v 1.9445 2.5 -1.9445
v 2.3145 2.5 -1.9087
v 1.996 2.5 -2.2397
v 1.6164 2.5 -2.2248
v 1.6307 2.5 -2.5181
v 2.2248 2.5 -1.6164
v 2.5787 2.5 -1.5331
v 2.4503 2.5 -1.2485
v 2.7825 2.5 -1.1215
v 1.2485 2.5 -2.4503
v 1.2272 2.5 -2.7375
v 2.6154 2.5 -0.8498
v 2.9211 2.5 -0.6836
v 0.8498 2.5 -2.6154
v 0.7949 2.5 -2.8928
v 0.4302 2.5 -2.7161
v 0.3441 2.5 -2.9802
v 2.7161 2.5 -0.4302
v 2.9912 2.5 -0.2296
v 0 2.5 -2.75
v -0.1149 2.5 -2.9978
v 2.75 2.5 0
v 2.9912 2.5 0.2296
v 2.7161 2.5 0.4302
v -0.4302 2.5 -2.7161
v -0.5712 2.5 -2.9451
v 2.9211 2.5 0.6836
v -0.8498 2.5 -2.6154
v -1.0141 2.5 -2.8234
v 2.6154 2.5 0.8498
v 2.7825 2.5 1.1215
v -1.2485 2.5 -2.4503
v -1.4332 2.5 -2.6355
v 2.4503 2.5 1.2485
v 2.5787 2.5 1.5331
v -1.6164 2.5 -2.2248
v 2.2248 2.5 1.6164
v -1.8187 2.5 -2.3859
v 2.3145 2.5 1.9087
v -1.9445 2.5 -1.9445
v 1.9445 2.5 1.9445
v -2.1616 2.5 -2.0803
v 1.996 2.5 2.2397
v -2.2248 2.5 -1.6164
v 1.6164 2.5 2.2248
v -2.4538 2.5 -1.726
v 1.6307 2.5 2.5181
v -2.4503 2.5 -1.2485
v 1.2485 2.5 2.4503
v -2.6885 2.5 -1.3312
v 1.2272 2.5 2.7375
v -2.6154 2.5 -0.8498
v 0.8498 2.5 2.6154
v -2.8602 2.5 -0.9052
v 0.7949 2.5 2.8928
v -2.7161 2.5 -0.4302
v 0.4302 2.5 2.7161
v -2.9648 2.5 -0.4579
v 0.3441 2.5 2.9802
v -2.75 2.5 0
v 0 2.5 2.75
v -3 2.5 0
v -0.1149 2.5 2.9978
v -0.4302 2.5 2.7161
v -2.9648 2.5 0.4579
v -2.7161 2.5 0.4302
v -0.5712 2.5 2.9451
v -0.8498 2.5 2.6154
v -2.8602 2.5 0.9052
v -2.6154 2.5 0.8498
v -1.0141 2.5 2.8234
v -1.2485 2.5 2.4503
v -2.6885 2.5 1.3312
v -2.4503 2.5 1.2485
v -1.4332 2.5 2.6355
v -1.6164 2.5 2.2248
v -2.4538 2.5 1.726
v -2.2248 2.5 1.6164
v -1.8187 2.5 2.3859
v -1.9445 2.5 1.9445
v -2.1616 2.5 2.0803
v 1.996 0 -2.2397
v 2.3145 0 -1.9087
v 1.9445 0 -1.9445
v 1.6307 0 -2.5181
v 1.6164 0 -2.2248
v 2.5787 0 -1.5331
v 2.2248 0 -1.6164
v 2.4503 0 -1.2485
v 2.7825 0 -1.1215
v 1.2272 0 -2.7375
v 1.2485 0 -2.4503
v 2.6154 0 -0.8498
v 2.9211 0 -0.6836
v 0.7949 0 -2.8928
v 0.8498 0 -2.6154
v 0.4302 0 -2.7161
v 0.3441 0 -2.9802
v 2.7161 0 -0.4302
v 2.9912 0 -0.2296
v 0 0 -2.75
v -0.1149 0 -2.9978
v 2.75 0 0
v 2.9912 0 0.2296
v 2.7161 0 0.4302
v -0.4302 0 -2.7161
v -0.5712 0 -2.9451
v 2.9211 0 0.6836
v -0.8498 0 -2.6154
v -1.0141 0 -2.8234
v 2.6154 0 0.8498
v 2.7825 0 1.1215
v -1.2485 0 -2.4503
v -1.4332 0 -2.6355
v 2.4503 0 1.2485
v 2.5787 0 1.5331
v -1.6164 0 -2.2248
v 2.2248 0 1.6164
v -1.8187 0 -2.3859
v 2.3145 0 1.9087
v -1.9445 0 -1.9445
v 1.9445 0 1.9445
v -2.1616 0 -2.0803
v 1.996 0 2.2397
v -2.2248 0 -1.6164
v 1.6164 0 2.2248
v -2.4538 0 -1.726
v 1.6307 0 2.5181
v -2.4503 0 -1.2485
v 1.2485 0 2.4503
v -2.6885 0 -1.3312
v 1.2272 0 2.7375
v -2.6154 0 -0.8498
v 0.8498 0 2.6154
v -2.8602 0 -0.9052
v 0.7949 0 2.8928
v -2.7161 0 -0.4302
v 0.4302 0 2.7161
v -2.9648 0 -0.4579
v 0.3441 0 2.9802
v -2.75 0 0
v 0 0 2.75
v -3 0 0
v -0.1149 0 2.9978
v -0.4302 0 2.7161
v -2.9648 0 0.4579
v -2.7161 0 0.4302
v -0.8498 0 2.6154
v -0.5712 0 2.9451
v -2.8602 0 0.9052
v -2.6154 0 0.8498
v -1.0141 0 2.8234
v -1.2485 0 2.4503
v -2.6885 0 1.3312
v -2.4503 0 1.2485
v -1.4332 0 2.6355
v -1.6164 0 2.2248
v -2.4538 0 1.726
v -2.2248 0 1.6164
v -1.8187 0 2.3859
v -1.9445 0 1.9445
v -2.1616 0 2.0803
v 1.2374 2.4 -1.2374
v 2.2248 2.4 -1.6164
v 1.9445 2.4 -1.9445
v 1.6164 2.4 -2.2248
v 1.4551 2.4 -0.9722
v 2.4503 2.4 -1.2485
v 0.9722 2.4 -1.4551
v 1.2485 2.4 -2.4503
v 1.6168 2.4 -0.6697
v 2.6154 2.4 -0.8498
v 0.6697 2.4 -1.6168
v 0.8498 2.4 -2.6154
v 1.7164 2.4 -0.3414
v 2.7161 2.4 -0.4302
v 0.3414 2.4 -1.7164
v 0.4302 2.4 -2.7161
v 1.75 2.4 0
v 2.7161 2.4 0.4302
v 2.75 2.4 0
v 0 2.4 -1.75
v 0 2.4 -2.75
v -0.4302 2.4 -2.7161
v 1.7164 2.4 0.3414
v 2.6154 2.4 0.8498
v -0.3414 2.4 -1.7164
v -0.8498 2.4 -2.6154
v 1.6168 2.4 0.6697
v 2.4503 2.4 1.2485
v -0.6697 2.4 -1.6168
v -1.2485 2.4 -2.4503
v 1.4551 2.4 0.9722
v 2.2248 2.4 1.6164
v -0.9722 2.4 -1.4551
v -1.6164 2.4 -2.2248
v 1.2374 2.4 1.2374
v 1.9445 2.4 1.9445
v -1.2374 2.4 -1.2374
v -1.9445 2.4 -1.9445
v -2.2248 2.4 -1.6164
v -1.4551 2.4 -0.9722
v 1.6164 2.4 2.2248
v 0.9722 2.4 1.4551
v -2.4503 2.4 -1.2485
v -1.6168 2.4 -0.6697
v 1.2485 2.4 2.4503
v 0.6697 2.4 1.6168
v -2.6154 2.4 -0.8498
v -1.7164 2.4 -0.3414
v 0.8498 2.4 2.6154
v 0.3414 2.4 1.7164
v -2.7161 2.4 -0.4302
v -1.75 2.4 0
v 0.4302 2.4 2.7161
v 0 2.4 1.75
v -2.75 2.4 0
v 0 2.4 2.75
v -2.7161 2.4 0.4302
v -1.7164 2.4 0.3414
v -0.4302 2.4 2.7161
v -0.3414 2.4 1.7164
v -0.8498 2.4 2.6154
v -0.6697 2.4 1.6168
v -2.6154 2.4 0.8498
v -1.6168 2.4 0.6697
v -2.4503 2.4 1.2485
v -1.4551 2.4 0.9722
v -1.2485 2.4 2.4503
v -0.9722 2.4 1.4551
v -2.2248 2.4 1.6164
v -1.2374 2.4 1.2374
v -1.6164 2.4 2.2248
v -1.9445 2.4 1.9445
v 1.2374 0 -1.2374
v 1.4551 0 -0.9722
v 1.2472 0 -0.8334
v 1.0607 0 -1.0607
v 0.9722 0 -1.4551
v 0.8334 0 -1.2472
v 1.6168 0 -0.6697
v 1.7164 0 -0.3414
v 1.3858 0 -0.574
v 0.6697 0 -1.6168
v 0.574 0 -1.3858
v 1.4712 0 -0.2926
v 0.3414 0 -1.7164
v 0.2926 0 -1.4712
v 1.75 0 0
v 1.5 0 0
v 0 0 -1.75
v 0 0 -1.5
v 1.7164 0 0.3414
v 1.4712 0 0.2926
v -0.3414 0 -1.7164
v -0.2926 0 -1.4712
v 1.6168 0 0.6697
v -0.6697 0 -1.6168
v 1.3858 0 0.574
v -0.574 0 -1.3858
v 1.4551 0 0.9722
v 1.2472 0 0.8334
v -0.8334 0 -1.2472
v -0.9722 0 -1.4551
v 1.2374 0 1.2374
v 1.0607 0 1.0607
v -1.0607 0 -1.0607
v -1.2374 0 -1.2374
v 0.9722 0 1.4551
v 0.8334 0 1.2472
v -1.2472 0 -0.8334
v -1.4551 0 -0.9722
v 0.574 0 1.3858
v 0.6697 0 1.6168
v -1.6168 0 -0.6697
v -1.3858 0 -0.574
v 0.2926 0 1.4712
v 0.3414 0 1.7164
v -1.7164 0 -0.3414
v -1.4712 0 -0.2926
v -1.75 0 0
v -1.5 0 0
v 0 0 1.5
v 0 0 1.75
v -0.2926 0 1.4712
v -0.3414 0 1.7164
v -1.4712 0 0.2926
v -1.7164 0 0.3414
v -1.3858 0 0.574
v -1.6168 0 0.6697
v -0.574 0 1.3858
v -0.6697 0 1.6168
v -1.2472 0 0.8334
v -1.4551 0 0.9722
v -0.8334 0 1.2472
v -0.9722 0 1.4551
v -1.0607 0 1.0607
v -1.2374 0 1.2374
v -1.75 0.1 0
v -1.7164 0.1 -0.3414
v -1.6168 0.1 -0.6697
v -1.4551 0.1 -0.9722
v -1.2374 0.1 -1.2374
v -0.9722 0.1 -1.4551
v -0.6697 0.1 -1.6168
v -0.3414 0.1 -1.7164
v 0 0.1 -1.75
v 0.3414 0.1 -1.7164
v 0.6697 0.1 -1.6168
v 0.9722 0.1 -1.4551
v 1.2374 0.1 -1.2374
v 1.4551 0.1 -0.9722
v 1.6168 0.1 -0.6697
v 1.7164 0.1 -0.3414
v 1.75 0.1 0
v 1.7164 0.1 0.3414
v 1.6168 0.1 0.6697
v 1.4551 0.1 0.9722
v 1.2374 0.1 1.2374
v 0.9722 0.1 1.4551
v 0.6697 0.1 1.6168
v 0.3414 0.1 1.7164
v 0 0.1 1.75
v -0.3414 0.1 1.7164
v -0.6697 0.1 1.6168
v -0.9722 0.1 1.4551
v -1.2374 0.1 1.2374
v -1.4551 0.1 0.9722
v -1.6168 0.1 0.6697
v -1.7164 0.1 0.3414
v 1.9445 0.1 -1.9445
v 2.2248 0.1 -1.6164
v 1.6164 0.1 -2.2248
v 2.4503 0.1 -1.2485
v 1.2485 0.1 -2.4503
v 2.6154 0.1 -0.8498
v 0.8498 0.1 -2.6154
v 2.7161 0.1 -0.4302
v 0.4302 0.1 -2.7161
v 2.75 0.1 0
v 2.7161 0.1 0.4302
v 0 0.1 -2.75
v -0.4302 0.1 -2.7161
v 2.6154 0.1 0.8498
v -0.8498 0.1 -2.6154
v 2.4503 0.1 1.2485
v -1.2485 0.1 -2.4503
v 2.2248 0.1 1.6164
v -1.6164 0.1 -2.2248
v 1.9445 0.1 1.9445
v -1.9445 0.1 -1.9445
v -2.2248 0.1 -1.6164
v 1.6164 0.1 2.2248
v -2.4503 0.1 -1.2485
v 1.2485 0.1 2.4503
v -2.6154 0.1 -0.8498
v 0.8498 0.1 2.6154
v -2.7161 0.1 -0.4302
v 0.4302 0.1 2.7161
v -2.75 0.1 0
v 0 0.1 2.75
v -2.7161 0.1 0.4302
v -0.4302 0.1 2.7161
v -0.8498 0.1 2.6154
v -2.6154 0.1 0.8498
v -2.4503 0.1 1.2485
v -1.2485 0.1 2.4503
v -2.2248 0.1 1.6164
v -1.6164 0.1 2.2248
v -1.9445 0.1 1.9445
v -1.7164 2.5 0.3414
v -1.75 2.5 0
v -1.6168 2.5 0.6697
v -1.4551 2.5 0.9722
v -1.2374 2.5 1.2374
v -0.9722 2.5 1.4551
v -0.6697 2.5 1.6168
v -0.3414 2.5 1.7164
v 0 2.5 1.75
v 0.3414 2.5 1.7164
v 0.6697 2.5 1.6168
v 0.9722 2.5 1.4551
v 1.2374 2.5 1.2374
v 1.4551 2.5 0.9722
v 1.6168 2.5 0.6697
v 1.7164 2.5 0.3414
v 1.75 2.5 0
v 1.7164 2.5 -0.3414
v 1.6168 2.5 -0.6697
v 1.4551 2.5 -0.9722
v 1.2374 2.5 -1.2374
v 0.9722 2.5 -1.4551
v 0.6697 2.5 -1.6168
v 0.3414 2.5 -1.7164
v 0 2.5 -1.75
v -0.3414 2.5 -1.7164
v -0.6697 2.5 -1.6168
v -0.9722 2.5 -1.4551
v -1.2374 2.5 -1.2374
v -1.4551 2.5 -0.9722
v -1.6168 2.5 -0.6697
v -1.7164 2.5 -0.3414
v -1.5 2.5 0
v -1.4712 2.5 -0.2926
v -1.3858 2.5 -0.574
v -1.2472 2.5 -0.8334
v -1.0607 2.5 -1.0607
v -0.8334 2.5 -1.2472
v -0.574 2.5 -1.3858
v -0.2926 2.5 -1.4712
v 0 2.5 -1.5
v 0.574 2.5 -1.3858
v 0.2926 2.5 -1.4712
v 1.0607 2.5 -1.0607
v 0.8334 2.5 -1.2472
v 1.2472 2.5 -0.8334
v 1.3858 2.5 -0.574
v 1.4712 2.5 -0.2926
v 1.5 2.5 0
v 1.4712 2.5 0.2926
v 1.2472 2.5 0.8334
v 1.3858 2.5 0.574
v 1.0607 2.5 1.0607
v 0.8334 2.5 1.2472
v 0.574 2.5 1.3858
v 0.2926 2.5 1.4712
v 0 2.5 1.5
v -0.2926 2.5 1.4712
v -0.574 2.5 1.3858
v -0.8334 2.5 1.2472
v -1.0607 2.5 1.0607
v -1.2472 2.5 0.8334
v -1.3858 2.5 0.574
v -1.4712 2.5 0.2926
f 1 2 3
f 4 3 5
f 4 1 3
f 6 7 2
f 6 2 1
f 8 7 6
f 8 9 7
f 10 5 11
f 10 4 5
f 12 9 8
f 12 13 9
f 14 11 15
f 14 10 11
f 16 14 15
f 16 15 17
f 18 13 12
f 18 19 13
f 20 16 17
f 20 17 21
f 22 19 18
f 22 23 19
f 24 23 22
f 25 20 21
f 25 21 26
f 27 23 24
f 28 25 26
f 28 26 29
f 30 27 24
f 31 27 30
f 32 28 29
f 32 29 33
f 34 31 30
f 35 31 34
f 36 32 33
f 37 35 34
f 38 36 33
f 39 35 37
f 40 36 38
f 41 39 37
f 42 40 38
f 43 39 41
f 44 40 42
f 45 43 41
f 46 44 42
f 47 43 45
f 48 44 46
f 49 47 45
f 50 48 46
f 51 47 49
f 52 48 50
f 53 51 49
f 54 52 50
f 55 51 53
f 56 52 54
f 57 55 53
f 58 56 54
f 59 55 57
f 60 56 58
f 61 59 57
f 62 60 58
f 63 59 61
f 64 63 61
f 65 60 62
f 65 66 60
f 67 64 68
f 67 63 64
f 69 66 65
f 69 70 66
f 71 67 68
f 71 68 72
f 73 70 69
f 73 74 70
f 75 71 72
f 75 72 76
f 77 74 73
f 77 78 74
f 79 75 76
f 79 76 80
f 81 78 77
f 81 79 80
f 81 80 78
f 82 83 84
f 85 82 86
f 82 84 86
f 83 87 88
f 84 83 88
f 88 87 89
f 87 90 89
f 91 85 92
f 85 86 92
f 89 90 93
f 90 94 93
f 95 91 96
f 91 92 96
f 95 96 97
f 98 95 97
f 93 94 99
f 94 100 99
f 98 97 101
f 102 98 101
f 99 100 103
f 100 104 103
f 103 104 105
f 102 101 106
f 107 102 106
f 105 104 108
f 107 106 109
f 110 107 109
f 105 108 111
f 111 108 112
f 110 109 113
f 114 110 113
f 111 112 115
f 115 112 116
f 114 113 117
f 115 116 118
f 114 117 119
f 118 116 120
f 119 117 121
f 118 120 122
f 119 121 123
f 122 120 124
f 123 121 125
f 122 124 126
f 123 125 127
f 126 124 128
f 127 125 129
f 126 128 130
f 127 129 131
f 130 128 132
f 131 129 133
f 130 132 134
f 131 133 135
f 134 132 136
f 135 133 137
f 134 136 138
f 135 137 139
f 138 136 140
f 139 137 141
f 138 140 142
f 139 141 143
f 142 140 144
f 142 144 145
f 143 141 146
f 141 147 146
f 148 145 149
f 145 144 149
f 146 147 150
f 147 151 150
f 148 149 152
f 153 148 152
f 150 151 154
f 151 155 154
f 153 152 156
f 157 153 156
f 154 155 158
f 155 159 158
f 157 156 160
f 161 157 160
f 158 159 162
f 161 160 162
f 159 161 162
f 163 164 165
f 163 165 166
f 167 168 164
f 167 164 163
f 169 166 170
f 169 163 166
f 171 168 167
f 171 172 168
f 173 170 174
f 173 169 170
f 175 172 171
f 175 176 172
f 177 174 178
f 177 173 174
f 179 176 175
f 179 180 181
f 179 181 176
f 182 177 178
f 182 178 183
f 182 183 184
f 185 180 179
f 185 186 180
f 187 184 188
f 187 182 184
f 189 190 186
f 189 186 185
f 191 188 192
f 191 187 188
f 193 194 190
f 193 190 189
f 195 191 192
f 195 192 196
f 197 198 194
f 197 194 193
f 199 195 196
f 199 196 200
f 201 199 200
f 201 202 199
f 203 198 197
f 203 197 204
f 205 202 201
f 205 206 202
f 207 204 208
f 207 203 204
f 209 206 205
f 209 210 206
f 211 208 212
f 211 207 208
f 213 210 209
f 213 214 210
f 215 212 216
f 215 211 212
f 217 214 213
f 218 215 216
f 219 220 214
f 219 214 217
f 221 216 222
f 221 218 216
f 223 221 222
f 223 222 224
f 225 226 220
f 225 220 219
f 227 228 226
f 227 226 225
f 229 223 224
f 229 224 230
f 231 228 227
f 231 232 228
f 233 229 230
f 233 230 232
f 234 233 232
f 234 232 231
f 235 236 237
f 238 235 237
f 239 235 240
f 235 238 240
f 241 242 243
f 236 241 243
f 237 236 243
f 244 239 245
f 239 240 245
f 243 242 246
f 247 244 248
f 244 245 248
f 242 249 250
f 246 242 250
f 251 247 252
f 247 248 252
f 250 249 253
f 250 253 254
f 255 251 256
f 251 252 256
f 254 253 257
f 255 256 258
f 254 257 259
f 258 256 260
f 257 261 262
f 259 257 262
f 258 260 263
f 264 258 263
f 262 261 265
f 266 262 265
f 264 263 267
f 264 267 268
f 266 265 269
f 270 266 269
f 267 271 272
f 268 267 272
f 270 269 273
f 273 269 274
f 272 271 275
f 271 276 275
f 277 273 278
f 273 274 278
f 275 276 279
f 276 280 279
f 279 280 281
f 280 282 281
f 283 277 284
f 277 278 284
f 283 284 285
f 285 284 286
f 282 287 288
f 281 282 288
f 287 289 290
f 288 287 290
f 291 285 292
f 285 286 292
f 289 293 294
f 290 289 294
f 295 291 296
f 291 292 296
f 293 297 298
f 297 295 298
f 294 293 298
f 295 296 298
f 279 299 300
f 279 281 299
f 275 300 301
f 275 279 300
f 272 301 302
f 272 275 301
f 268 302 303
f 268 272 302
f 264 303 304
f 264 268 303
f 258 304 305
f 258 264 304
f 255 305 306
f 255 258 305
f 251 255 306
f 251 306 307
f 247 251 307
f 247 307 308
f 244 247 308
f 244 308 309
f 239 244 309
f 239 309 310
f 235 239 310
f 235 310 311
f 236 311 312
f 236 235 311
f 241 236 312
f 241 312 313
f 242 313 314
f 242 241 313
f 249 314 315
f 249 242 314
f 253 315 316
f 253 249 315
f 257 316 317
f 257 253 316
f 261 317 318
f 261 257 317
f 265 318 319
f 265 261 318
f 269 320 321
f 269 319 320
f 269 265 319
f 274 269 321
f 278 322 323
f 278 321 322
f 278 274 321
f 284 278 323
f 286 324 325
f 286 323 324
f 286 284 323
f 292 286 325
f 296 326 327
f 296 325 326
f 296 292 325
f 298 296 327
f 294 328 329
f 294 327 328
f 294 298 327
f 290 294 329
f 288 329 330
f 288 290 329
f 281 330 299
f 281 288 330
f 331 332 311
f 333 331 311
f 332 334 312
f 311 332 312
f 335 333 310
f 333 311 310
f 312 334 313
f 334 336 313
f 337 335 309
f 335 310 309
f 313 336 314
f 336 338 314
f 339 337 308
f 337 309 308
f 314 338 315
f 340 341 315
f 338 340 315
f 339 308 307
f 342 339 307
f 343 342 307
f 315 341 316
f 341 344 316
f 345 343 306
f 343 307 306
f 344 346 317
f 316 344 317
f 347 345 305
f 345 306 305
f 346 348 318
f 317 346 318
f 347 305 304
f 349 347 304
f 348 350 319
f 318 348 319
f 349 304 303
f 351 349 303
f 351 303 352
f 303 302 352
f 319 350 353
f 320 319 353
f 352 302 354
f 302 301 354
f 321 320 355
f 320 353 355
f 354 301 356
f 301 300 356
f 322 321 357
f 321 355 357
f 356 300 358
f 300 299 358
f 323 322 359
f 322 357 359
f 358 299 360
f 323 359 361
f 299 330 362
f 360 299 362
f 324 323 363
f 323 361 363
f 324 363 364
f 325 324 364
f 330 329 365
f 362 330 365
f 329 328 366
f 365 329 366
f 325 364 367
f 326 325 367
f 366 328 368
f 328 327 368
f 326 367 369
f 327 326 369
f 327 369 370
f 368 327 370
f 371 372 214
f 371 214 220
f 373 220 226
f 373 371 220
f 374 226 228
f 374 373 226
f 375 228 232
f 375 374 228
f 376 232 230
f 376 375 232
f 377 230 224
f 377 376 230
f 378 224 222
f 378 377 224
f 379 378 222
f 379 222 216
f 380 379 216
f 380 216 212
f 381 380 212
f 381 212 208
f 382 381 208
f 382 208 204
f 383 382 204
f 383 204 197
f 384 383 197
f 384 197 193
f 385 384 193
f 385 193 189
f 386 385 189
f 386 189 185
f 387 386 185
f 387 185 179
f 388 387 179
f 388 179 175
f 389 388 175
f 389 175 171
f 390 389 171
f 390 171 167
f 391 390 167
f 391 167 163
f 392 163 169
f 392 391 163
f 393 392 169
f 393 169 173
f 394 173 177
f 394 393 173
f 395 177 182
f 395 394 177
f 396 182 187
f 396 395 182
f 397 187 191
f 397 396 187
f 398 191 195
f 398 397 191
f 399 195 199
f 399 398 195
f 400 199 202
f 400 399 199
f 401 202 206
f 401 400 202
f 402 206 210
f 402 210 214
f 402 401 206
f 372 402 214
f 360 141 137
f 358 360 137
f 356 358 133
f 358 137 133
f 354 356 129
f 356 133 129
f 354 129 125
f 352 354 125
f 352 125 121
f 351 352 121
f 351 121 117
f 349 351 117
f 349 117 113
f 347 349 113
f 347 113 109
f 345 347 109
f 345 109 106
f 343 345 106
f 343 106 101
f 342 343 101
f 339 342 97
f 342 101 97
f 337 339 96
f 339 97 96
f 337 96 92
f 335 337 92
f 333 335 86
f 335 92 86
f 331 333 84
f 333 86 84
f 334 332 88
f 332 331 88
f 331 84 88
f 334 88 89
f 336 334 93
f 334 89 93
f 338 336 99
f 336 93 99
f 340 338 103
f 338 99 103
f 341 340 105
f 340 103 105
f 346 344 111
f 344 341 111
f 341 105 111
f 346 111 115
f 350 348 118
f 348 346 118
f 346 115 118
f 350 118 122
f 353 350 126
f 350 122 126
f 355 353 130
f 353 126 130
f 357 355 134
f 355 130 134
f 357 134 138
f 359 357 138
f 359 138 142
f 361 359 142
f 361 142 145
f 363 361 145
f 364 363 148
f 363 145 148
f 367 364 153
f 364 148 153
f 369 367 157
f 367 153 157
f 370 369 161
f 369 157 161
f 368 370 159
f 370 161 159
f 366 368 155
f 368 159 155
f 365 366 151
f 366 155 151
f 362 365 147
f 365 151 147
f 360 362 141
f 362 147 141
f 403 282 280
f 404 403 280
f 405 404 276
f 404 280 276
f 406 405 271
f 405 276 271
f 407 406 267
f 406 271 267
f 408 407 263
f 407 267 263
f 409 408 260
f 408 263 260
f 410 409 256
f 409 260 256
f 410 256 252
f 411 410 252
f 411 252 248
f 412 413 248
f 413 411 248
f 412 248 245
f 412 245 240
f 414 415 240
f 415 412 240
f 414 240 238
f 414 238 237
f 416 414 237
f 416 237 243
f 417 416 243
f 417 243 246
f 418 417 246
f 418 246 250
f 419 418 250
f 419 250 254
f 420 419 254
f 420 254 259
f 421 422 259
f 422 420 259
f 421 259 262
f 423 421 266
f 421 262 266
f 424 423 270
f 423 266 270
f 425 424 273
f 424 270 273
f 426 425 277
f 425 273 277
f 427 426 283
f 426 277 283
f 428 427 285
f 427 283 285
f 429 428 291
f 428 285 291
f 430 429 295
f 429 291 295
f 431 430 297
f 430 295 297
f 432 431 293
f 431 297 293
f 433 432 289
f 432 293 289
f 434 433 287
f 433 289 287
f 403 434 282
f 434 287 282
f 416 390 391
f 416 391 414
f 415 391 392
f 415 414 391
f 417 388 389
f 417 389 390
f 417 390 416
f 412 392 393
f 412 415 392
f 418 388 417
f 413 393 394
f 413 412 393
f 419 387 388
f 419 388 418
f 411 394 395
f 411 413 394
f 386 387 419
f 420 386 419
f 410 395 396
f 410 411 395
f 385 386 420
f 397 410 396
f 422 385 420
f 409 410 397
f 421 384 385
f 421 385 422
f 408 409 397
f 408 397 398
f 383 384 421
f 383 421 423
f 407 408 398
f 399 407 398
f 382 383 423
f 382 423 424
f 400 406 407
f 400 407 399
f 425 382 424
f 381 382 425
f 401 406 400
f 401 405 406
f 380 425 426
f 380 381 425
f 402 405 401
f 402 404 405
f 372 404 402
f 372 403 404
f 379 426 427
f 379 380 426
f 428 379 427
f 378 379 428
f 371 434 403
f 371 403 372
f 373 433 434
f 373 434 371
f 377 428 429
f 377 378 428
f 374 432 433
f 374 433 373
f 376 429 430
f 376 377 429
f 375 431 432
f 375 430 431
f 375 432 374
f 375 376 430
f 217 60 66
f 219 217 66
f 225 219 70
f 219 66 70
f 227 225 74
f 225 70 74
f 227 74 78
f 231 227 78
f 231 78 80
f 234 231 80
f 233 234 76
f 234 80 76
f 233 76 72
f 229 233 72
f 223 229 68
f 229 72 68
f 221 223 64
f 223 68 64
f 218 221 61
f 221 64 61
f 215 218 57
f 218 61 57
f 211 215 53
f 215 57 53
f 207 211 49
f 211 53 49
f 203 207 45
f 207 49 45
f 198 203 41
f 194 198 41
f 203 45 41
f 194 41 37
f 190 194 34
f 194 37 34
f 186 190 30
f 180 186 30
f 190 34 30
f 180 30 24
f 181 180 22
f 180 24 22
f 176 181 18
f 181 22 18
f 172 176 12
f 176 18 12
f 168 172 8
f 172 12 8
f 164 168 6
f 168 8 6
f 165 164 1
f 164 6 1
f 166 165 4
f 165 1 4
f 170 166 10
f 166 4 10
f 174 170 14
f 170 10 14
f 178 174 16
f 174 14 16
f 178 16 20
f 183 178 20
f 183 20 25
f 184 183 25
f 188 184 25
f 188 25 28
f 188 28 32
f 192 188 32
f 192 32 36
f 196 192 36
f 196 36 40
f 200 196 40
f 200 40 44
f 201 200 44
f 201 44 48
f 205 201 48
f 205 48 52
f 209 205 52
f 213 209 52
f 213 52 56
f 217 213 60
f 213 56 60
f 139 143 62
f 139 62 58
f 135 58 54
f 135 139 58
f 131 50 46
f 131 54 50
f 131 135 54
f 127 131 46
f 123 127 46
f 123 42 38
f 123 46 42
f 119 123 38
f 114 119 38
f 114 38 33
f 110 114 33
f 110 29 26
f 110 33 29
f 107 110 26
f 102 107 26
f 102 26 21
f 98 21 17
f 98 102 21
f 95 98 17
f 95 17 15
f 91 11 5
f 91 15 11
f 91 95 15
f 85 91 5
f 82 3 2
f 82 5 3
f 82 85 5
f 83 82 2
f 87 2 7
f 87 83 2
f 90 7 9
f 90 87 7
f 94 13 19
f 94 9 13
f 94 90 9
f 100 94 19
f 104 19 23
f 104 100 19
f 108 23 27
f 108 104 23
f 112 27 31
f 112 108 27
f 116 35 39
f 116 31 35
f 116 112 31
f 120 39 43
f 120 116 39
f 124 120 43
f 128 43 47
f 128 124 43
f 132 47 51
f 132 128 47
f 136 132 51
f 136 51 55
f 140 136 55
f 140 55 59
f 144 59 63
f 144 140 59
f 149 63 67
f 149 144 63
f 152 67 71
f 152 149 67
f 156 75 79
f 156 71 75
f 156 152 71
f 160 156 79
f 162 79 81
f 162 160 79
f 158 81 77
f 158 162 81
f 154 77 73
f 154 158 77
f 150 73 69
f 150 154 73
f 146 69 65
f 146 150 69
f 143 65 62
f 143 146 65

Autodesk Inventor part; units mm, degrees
ref_plane "YZ Plane" through (0, 0, 0) normal (1, 0, 0) x (0, 1, 0)
ref_plane "XZ Plane" through (0, 0, 0) normal (0, 1, 0) x (-1, 0, 0)
ref_plane "XY Plane" through (0, 0, 0) normal (0, 0, 1) x (1, 0, 0)
sketch "Sketch1" plane through (0, 0, 0) normal (0, 1, 0) x (-1, 0, 0)
  circle A0 centre (0, 0) radius 3
  circle A1 centre (0, 0) radius 1.5
  circle A2 centre (0, 0) radius 1.75
  circle A3 centre (0, 0) radius 2.75
  dimension "d0" = 6
  dimension "d1" = 3
  dimension "d2" = 3.5
  dimension "d3" = 5.5
extrude "Extrusion1" add sketch "Sketch1" along normal blind 2.5 contours A0 | A2 | A3
extrude "Extrusion2" cut sketch "Sketch1" against normal blind 0.1 from surface at 2.5 contours A3
extrude "Extrusion3" cut sketch "Sketch1" along normal blind 0.1 contours A3
properties part number "Miniatur Kugellager MR 63 2RS 3x6x2.5 mm"
